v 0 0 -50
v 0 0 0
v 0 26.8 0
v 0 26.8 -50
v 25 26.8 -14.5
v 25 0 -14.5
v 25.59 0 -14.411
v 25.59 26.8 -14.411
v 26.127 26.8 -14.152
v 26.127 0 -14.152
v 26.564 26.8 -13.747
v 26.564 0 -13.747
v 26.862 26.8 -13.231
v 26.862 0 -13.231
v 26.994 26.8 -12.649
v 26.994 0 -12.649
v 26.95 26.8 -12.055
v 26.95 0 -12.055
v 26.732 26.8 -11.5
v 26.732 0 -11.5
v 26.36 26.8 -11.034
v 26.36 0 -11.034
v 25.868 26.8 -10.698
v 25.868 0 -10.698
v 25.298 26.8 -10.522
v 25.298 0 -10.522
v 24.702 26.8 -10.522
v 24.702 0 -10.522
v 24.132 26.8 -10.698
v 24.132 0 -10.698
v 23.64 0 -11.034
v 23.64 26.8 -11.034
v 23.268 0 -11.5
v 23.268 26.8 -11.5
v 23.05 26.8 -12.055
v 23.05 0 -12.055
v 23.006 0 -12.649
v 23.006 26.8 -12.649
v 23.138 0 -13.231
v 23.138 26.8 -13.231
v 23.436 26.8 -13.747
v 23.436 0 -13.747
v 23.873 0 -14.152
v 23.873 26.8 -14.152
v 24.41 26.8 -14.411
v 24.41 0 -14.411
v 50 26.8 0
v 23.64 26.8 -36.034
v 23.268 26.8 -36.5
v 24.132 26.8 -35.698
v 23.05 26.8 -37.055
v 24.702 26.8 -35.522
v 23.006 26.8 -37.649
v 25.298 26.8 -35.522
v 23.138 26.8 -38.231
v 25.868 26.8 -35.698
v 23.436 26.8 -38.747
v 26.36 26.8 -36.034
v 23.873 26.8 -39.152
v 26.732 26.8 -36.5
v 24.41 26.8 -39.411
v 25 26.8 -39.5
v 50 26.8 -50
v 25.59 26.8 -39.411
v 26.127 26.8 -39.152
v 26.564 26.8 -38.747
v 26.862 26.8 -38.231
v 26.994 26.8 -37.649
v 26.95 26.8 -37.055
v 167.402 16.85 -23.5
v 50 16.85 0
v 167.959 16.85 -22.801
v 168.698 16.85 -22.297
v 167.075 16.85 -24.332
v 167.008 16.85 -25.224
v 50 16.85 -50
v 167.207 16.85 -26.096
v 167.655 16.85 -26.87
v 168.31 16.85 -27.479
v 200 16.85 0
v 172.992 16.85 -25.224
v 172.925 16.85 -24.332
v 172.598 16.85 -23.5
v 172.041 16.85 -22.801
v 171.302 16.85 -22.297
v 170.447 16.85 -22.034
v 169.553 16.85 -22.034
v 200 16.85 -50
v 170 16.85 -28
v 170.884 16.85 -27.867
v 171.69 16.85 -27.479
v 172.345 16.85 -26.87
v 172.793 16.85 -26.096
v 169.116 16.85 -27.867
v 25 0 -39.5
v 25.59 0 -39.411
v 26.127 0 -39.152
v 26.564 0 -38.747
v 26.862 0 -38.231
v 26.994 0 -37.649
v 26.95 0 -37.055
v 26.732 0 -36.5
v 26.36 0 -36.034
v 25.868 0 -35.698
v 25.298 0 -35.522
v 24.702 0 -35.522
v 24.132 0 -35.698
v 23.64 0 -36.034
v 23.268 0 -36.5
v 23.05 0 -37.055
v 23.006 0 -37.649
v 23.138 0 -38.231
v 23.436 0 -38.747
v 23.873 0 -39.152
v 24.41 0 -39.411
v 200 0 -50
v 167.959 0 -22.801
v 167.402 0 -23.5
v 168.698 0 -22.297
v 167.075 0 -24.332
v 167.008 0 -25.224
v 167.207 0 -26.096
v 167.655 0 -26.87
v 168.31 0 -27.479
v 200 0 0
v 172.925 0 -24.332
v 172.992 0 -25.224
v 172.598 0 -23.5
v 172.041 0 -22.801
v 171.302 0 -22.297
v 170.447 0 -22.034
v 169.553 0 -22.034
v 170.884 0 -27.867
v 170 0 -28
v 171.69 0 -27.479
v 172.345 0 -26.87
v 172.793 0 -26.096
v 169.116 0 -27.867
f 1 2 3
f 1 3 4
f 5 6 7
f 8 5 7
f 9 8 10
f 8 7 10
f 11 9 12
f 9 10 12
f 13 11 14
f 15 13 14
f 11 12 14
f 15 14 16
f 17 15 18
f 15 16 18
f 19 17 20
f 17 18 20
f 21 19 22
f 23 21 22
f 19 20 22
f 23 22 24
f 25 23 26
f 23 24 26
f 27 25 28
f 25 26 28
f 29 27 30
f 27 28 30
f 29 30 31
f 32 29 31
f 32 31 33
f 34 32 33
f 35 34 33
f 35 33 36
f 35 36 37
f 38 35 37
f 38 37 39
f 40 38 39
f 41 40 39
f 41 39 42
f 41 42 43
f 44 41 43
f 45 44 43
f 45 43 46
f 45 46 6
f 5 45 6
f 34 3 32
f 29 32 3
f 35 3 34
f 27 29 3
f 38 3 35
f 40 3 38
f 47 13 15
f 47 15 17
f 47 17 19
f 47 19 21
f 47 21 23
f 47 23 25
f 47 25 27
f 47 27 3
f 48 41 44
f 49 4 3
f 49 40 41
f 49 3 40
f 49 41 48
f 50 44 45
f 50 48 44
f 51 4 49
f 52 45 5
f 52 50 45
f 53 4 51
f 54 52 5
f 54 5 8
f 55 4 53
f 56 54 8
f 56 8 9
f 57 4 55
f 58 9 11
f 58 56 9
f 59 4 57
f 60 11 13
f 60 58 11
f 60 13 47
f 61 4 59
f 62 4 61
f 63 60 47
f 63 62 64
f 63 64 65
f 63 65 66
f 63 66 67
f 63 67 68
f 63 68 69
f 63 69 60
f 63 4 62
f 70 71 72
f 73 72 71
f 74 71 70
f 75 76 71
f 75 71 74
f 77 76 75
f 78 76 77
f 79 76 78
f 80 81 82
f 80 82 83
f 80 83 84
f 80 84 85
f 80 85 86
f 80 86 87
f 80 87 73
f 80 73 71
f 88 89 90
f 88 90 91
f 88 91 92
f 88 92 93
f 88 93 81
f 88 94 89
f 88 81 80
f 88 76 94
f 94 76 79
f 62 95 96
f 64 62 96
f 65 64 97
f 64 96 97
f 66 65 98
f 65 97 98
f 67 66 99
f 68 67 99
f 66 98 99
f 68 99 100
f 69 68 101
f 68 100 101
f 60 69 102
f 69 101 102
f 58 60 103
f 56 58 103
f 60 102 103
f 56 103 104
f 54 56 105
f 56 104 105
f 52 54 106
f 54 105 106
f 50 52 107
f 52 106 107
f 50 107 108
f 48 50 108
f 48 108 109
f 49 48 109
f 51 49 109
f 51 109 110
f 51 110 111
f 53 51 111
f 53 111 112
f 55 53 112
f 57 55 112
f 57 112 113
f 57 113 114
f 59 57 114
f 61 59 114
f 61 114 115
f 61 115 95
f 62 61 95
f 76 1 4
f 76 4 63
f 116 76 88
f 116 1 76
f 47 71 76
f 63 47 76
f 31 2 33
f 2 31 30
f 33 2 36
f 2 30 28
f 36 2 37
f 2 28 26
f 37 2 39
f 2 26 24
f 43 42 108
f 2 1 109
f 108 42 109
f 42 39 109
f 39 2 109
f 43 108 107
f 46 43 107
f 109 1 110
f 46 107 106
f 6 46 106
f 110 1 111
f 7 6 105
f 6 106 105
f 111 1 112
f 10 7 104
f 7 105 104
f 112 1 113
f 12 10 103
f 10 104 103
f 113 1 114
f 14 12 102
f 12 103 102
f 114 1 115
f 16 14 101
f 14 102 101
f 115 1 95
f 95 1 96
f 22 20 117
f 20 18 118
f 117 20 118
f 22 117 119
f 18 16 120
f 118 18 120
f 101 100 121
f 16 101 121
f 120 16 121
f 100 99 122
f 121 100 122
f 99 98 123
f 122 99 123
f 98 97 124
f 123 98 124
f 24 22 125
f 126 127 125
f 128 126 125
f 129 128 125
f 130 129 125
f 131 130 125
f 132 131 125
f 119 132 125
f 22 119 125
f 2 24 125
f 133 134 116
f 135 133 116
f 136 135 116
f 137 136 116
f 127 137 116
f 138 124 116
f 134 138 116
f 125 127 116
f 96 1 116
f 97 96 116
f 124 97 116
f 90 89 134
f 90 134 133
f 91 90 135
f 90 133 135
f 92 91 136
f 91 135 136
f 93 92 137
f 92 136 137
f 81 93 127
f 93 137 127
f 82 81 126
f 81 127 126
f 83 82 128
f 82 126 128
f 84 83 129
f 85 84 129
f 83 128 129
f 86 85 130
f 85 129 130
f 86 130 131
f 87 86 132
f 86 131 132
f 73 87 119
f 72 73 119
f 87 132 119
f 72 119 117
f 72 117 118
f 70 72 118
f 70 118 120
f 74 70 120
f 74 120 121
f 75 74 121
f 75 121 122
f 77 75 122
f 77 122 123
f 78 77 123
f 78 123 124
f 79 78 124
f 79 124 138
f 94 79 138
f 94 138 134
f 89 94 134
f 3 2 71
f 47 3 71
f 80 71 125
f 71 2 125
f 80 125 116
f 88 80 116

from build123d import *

# Parameters (mm, degrees)
SKETCH1_W           = 50
SKETCH1_H           = 50
BOSS_EXTRUDE1_DEPTH = 26.8
SKETCH1_3_W         = 150
SKETCH1_3_H         = 50
BOSS_EXTRUDE2_DEPTH = 16.85
SKETCH2_R           = 2
SKETCH2_R_2         = 3
CUT_EXTRUDE1_DEPTH  = 208.889970898


with BuildPart() as part:
    # Sketch1 → Boss-Extrude1 (new body)
    with BuildSketch(Plane(origin=(0, 0, 0), x_dir=(1, 0, 0), z_dir=(0, 1, 0))):
        with Locations((25, 25)):
            Rectangle(SKETCH1_W, SKETCH1_H)
    extrude(amount=BOSS_EXTRUDE1_DEPTH)

    # Sketch1<3> → Boss-Extrude2 (add)
    with BuildSketch(Plane(origin=(0, 0, 0), x_dir=(1, 0, 0), z_dir=(0, 1, 0))):
        with Locations((125, 25)):
            Rectangle(SKETCH1_3_W, SKETCH1_3_H)
    extrude(amount=BOSS_EXTRUDE2_DEPTH)

    # Sketch2 → Cut-Extrude1 (cut, through all)
    with BuildSketch(Plane.XZ):
        with Locations((25, -37.5)):
            Circle(SKETCH2_R)
        with Locations((25, -12.5)):
            Circle(SKETCH2_R)
        with Locations((170, -25)):
            Circle(SKETCH2_R_2)
    extrude(amount=-CUT_EXTRUDE1_DEPTH, mode=Mode.SUBTRACT)


solid = part.part
